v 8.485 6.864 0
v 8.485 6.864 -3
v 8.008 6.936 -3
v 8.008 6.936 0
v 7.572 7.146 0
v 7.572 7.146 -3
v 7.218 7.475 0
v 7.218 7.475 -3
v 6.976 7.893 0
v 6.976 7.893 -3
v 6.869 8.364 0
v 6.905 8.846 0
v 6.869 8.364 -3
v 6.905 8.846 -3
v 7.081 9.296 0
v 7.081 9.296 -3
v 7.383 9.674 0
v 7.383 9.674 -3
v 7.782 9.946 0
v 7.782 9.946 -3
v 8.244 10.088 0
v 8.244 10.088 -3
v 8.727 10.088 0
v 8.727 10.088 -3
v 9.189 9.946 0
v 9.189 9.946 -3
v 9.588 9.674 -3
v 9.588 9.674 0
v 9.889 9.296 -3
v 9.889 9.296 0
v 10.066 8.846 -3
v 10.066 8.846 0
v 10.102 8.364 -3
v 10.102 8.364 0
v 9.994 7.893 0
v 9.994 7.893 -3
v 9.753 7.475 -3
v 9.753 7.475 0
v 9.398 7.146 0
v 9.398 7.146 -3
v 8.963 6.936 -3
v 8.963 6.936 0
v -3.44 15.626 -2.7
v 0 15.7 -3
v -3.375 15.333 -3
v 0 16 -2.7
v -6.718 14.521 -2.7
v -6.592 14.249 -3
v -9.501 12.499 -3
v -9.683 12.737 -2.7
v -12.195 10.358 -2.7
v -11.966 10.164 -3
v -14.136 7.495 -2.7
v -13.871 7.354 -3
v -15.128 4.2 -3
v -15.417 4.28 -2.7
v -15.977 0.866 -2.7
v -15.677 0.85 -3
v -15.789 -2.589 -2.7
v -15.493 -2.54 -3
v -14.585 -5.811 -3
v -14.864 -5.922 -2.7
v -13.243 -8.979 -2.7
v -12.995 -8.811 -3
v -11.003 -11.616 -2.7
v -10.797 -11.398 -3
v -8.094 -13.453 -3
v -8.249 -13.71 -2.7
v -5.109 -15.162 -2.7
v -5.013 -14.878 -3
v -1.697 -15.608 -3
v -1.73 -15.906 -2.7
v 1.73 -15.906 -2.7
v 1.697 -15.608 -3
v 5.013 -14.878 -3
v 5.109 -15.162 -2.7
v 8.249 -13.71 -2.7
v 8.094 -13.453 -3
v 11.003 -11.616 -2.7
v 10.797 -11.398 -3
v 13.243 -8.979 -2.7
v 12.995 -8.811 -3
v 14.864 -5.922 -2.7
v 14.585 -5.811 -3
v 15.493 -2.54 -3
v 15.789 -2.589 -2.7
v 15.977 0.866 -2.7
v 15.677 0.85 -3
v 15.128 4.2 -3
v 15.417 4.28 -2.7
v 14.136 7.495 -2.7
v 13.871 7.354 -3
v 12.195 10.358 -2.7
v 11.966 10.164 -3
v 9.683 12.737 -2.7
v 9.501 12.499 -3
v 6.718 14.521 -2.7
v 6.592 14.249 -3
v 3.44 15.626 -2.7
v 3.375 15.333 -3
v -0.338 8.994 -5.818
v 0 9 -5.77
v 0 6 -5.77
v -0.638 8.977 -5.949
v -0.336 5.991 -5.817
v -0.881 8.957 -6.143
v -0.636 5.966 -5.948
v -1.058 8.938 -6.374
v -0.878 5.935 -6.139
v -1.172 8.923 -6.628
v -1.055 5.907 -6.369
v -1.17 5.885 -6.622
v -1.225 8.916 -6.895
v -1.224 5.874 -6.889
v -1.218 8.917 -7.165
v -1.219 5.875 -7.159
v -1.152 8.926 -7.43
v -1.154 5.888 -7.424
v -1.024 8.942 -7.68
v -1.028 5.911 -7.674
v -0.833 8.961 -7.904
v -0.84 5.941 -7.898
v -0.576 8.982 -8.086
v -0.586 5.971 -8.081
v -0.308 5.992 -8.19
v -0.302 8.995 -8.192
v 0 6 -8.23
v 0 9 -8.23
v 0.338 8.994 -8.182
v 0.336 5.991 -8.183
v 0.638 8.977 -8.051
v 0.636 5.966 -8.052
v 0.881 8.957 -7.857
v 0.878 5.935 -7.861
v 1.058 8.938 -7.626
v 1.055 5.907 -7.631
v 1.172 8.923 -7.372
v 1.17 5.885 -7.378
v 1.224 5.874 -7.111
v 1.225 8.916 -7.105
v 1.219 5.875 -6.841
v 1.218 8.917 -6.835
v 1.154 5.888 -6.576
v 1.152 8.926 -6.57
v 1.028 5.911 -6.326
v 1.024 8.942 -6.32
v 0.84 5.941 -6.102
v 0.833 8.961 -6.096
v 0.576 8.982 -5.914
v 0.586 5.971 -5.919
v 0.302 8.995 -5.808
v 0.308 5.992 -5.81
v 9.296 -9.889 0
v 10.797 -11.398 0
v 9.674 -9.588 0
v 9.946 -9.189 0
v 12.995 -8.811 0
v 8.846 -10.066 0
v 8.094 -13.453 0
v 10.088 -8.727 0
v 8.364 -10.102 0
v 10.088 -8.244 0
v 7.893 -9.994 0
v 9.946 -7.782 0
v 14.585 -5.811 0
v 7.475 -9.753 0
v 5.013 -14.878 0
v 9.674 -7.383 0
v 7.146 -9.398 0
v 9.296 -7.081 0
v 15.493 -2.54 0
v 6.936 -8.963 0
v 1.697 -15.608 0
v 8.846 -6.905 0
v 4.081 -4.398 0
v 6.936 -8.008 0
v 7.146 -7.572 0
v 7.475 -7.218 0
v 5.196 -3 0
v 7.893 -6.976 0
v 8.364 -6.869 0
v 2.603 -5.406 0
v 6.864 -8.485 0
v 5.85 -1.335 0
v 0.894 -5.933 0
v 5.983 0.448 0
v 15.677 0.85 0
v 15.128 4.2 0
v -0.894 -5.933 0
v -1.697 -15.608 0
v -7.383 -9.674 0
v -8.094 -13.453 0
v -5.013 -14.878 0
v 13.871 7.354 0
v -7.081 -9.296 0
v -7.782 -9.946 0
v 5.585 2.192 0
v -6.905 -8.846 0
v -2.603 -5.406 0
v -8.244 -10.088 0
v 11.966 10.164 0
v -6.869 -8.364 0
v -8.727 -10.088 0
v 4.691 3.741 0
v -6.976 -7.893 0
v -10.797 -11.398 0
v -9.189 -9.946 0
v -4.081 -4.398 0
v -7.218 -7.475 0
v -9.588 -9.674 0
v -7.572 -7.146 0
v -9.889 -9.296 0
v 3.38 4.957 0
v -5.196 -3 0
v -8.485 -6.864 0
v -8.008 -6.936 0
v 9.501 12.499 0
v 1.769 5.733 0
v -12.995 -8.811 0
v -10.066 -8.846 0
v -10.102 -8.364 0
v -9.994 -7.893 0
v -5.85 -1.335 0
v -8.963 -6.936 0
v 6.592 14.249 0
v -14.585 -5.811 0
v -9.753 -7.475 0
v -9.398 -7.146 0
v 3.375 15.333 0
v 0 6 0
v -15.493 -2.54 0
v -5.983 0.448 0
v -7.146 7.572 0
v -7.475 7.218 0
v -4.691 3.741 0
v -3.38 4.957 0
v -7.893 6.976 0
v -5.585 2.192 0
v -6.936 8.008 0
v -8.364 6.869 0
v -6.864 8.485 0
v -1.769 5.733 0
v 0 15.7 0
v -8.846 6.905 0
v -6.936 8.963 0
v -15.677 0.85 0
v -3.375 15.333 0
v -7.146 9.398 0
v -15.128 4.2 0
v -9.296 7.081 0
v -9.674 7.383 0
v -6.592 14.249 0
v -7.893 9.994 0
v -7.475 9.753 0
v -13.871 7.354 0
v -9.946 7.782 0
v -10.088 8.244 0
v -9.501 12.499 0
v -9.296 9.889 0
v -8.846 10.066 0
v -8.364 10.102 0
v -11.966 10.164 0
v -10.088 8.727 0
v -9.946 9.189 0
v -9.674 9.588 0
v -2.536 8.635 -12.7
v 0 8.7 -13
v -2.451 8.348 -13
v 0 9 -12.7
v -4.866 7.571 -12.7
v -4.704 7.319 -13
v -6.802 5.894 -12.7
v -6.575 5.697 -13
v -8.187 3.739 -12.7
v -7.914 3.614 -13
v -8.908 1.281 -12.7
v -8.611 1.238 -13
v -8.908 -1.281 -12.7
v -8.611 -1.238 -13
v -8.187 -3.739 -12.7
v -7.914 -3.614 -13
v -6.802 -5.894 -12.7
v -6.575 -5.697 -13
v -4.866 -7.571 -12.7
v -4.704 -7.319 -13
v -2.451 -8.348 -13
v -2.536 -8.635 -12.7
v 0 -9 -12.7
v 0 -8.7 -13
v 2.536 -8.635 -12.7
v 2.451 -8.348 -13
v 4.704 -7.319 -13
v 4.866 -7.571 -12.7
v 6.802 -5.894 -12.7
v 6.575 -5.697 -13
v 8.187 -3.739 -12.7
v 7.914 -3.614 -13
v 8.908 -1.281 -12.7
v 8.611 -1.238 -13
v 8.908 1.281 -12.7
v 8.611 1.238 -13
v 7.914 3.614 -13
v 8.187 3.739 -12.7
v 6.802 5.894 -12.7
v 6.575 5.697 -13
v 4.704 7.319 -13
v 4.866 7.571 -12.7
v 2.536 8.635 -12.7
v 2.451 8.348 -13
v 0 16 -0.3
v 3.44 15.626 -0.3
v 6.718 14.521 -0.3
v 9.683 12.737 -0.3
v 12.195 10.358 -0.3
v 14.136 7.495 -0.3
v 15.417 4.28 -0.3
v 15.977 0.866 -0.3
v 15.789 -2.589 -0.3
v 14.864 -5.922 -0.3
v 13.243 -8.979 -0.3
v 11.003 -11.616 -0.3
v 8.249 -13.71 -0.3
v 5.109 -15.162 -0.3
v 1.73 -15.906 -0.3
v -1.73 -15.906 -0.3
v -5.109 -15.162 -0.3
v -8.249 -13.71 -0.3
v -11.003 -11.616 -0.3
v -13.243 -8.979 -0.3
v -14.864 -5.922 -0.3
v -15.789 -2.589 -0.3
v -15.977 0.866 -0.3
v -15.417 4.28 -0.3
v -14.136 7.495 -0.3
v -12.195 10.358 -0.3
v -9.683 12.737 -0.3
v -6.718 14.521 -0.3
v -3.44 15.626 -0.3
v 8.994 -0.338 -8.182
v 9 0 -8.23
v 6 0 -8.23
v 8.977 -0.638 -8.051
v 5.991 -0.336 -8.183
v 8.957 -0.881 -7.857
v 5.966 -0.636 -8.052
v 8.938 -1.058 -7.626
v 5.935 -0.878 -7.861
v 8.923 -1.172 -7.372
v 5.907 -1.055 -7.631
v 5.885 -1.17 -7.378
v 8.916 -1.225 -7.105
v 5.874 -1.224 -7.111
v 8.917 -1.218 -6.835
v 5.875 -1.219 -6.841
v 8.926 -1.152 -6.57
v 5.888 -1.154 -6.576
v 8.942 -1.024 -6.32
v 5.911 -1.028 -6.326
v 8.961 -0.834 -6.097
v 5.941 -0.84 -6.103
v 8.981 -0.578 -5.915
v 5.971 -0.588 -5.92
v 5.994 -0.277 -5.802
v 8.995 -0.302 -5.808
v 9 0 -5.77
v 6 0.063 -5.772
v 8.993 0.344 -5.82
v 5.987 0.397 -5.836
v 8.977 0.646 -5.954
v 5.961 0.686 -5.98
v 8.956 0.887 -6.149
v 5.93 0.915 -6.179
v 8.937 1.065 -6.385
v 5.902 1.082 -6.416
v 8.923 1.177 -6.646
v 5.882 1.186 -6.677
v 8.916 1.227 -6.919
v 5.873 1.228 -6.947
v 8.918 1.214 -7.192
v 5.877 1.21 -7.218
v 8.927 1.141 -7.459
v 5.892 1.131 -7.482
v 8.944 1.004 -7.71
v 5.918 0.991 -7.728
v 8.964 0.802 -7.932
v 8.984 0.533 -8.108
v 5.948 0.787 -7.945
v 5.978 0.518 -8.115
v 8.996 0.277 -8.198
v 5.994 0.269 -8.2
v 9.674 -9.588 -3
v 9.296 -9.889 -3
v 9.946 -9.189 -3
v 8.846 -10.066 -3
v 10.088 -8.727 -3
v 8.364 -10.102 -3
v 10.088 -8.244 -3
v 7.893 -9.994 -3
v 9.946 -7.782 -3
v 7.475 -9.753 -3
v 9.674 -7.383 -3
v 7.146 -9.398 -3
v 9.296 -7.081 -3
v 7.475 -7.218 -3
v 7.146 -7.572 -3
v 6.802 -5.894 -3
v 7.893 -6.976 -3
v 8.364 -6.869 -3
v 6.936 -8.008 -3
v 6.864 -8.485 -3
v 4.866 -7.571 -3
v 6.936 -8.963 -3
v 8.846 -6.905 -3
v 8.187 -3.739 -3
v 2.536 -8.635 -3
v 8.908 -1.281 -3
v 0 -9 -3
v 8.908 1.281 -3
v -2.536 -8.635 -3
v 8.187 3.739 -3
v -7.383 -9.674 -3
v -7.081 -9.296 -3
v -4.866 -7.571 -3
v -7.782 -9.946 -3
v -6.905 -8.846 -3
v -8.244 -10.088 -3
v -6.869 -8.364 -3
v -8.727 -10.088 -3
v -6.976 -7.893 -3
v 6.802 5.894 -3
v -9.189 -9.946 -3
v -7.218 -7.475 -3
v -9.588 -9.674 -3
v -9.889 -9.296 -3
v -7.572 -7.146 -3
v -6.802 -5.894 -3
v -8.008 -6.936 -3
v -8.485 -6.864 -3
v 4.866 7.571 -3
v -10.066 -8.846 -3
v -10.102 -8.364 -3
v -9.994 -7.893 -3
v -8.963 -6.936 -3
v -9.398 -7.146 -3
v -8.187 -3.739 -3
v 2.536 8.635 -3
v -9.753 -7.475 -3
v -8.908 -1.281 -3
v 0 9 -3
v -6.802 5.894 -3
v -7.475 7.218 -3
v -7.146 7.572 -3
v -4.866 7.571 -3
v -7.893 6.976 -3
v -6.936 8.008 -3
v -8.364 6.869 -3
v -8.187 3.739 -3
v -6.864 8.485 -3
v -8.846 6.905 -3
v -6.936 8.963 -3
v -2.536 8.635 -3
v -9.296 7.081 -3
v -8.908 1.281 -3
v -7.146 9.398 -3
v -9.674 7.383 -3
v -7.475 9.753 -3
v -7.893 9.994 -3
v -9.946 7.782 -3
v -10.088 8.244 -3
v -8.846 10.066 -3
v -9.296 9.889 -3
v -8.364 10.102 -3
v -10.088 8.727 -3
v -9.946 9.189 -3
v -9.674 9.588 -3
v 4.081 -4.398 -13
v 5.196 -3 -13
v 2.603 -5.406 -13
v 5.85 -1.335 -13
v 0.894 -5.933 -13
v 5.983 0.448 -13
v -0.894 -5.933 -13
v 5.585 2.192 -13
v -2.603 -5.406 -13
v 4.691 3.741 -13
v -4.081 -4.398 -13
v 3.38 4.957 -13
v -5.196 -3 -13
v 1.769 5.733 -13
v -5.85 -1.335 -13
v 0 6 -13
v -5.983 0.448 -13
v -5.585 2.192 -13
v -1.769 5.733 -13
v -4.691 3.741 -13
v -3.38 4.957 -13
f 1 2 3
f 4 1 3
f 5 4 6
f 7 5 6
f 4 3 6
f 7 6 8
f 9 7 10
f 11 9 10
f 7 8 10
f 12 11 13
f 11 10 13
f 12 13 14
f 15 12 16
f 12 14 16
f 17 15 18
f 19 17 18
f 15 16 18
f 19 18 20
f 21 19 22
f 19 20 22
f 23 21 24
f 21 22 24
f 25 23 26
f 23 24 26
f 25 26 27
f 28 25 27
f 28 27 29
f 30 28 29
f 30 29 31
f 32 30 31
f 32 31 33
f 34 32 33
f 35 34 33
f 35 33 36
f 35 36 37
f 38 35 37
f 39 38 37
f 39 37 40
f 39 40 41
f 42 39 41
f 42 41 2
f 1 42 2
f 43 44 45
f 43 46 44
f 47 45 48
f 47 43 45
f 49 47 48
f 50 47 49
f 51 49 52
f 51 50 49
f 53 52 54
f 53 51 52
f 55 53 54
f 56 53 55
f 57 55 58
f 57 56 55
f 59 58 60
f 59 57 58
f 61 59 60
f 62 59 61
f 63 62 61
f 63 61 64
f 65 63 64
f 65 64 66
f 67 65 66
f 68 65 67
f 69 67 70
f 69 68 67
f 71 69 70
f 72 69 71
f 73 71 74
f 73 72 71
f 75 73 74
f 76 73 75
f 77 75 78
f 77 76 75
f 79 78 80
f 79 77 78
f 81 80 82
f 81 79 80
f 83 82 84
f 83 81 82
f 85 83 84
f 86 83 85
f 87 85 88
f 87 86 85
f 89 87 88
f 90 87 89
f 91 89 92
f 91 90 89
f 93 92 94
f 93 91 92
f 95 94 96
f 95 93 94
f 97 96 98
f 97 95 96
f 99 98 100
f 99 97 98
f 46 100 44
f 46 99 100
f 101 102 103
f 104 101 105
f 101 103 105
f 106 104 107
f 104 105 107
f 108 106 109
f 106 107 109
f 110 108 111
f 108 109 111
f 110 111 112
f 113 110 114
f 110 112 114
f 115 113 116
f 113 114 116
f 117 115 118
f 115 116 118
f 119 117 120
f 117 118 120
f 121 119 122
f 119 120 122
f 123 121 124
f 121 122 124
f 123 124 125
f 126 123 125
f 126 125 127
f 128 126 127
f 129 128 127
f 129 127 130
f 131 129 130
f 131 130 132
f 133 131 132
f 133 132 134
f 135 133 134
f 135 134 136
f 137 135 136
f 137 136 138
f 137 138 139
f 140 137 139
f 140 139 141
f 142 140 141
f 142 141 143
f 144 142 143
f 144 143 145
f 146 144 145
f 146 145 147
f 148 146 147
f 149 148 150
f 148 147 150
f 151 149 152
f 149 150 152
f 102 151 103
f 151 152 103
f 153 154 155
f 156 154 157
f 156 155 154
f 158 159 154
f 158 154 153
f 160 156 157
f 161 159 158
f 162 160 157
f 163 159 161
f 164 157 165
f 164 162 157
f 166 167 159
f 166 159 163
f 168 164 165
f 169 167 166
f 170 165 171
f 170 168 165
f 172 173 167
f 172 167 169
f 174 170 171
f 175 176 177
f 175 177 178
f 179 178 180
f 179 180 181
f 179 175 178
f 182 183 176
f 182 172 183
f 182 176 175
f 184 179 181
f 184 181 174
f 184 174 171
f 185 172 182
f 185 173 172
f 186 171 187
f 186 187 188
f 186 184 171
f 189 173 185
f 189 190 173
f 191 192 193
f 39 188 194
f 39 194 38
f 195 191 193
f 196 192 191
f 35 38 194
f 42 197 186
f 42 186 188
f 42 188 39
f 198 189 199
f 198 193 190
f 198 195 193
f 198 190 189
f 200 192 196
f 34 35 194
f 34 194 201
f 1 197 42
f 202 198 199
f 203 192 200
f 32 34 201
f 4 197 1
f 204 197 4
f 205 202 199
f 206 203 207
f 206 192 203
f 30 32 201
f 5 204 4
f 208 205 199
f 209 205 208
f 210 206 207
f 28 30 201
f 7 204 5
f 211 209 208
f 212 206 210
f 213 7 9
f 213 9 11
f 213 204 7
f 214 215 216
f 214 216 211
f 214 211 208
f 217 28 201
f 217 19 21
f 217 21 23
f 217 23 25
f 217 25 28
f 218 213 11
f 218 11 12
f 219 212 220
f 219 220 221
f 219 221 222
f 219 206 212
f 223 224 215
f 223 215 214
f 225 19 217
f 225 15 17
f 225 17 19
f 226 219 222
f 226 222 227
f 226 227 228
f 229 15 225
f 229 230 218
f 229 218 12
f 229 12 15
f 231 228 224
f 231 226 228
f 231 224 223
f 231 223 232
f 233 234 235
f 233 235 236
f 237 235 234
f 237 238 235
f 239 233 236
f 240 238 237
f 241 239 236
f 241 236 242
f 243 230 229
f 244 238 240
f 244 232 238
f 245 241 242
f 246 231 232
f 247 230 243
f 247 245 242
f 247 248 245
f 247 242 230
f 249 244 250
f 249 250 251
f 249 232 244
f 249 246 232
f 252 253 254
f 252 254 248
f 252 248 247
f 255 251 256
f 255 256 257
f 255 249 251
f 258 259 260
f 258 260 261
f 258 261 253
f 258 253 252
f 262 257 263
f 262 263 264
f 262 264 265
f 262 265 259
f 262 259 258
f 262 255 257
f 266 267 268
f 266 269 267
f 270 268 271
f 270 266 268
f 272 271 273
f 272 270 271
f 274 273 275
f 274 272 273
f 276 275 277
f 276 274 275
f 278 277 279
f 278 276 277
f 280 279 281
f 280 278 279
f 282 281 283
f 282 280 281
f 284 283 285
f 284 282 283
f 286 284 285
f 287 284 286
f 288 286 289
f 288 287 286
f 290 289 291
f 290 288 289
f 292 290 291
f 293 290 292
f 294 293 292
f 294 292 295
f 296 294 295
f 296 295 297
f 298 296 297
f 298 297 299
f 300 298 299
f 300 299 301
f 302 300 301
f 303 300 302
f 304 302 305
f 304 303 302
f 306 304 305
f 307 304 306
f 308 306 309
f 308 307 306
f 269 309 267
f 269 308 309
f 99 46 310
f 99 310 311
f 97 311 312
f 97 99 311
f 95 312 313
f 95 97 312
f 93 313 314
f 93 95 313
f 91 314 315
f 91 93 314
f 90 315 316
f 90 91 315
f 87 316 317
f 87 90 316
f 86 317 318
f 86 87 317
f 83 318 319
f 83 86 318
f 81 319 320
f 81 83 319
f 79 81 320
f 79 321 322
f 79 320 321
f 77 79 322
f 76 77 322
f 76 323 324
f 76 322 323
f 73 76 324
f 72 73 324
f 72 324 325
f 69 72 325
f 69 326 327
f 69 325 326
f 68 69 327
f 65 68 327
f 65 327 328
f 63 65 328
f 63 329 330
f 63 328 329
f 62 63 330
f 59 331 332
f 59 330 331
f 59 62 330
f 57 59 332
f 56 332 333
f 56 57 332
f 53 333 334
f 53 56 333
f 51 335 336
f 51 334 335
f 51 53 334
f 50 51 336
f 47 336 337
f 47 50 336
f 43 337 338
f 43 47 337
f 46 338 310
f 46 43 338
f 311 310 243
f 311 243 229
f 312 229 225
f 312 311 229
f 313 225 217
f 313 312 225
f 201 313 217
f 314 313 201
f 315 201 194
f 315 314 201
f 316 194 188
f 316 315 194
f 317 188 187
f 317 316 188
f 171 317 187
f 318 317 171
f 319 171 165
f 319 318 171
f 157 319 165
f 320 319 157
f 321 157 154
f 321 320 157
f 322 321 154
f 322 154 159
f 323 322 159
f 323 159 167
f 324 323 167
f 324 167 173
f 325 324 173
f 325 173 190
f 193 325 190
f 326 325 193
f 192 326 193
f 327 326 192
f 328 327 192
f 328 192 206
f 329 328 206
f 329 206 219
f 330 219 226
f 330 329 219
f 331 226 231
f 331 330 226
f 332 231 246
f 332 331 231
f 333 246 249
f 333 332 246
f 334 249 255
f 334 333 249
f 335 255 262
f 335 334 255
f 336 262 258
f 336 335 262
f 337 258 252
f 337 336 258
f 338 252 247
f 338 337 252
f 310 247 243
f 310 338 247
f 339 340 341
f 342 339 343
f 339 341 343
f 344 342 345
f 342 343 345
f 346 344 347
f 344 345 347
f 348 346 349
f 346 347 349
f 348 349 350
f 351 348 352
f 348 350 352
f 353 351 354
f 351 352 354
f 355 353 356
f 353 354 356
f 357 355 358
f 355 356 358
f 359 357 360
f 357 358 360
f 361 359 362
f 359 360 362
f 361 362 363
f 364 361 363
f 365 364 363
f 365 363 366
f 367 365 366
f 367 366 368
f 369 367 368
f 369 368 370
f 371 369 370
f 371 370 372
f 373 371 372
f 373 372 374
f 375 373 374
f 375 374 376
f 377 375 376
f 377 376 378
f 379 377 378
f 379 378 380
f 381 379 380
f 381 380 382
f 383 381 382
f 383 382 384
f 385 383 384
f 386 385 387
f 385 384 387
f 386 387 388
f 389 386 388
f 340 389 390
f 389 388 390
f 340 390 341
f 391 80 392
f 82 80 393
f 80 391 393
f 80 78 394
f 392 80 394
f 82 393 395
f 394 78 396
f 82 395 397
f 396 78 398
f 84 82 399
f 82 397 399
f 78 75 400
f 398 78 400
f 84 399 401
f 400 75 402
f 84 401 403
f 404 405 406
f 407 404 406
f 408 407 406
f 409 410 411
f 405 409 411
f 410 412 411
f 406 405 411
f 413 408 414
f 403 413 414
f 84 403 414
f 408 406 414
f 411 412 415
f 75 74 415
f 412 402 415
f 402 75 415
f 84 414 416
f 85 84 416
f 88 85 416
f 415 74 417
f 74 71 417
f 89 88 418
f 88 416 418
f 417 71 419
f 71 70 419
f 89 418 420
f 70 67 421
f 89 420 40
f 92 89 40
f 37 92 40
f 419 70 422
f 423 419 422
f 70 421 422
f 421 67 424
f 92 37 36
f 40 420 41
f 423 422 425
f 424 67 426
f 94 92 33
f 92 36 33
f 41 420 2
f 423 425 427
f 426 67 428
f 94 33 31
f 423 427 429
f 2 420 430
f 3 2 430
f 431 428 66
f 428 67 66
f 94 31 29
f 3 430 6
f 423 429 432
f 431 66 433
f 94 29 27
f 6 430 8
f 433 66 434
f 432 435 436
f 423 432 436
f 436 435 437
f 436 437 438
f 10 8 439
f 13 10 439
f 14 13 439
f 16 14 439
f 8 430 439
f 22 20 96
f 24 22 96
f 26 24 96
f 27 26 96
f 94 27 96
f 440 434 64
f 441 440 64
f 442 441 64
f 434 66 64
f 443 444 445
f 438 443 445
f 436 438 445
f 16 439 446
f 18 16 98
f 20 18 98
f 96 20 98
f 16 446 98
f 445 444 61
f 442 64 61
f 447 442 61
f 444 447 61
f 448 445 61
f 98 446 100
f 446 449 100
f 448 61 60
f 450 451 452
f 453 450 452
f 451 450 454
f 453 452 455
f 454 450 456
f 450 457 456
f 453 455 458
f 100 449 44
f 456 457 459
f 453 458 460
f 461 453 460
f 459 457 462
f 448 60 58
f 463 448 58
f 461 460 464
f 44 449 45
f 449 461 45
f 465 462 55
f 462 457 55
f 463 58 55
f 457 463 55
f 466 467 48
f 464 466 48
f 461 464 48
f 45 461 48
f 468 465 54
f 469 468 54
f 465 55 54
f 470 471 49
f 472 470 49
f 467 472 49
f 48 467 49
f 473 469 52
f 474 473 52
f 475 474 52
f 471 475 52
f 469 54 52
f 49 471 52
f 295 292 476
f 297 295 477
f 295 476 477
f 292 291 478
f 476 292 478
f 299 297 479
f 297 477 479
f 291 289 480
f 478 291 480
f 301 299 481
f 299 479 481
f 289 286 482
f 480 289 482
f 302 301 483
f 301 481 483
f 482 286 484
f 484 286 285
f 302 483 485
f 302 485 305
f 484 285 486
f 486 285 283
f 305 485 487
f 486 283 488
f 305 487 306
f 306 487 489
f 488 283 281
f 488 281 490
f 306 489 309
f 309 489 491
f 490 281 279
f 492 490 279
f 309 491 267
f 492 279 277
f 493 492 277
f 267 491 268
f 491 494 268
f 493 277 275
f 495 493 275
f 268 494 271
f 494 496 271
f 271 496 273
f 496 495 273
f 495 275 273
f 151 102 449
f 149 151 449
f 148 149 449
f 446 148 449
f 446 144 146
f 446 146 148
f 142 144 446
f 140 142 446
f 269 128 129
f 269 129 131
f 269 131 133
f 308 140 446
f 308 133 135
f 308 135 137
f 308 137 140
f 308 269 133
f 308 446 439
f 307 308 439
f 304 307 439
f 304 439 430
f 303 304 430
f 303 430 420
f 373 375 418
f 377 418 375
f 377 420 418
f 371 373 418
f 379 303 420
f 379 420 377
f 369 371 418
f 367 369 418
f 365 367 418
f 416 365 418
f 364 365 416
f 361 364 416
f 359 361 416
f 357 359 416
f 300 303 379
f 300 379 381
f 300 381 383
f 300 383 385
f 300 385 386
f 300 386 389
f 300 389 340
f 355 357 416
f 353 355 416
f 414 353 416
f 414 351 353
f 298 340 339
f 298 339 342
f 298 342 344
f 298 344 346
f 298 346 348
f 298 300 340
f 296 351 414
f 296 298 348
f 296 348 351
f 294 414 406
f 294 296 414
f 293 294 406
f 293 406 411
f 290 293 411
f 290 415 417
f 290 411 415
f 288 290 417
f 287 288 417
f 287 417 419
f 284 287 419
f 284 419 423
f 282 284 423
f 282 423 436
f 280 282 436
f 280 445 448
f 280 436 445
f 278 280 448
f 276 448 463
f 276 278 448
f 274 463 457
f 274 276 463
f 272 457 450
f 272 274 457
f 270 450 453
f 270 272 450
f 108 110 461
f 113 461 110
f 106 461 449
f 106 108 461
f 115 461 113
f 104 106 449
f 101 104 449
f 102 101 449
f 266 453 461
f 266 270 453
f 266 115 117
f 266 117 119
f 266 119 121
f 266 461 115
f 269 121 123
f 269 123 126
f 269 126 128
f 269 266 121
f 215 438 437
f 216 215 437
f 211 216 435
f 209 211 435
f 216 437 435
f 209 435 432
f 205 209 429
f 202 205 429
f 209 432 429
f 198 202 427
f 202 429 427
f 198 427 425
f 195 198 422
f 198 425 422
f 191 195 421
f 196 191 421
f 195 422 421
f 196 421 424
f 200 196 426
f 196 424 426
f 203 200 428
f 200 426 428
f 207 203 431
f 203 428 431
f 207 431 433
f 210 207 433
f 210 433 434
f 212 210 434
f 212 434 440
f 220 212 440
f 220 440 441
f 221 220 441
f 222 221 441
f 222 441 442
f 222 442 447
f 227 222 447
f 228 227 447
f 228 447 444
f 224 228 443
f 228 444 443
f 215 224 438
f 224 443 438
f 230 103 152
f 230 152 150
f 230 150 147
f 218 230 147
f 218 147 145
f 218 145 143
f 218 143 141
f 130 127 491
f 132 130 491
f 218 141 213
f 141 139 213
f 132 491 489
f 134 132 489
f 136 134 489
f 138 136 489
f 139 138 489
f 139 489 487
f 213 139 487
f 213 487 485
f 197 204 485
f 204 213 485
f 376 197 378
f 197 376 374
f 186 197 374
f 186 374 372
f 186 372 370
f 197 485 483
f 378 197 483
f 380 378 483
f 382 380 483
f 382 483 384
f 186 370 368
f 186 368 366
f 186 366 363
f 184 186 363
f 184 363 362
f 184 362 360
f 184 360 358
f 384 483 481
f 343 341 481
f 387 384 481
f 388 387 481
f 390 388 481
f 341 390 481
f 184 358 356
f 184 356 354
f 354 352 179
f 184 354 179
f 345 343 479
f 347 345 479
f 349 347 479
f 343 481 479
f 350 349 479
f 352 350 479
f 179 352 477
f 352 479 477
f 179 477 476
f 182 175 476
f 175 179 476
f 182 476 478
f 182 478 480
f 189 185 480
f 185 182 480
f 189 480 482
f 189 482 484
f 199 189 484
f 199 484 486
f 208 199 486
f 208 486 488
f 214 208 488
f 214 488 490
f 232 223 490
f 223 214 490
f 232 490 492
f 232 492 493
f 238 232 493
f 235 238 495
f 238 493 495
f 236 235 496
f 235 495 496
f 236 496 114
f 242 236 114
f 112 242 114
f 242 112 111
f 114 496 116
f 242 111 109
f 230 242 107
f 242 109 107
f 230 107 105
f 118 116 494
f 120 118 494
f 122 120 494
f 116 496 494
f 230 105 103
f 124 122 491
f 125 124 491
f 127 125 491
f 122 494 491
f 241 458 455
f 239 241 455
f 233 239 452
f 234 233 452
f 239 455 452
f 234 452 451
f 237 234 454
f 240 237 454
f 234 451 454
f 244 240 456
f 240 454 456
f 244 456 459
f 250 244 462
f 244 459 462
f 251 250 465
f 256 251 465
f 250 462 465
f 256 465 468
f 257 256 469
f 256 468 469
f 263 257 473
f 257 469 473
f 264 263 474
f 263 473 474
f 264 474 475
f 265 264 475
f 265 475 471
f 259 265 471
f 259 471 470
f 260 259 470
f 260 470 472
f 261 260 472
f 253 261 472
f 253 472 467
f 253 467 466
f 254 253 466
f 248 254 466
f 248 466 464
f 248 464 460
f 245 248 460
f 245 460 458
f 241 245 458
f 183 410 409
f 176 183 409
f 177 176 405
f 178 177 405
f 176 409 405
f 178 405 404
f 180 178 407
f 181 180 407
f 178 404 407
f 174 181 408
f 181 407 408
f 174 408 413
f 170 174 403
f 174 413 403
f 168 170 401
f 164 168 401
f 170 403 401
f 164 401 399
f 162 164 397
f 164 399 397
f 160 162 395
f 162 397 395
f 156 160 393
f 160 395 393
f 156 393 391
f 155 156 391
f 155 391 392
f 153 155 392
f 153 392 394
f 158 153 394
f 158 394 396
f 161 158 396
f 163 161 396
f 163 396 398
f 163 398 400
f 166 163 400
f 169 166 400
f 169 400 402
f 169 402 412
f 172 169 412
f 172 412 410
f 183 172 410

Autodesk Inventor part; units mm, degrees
ref_plane "XY Plane" through (0, 0, 0) normal (0, 0, 1) x (1, 0, 0)
sketch "Sketch1" plane through (0, 0, 0) normal (1, 0, 0) x (0, 1, 0)
  line L0 (6, 0) -> (16, 0)
  line L1 (16, 0) -> (16, -3)
  line L2 (16, -3) -> (9, -3)
  line L3 (9, -3) -> (9, -13)
  line L4 (9, -13) -> (6, -13)
  line L5 (6, 0) -> (6, -13)
  line L6 (0, -15.6) -> (0, 2.6) projected
  point P0 (0, 0)
  dimension "d1" = 3
  dimension "d3" = 10
  dimension "d23" = 3
  dimension "d24" = 10
  dimension "d25" = 6
revolve "Revolution1" add sketch "Sketch1" angle 360 about axis through (0, 0, -10) along (0, 0, 1)
chamfer "Chamfer1" distance 0.3 angle 45 3 edges at (0, -16, 0) (0, -16, -3) (0, -9, -13)
sketch "Sketch4" plane through (0, 0, 0) normal (0, 0, 1) x (1, 0, 0)
  line L0 (8.4853, 8.4853) -> (0, 0)
  line L1 (-22.4, 0) -> (22.4, 0) projected
  point P0 (8.4853, 8.4853)
  dimension "d37" = 45
  dimension "d38" = 8.4853
hole "Hole3" at (8.4853, 8.4853, 0) direction (0, 0, -1) diameter 3.242 depth 6 tip angle 118 thread size "M4x0.7" class "6H" standard "ISO Metric profile"
pattern_circular "Circular Pattern1" count 4 over 360 about axis through (0, 0, -10) along (0, 0, 1) of "Hole3"
ref_plane "Work Plane1" through (0, 9, 0) normal (0, 1, 0) x (-1, 0, 0)
ref_plane "Work Plane2" through (9, 0, 0) normal (1, 0, 0) x (0, 1, 0)
sketch "Sketch5" plane through (0, 9, 0) normal (0, 1, 0) x (-1, 0, 0)
  line L0 (8.7, -13) -> (-8.7, -13) projected
  point P0 (0, 0)
  point P1 (0, -7)
  dimension "d41" = 6
sketch "Sketch6" plane through (9, 0, 0) normal (1, 0, 0) x (0, 1, 0)
  line L0 (8.7, -13) -> (-8.7, -13) projected
  point P0 (0, 0)
  point P1 (0, -7)
  dimension "d42" = 6
hole "Hole4" at (0, 9, -7) direction (0, -1, 0) diameter 2.459 depth 8.8 tip angle 118 thread size "M3x0.5" class "6H" standard "ISO Metric profile"
hole "Hole5" at (9, 0, -7) direction (-1, 0, 0) diameter 2.459 depth 8.8 tip angle 118 thread size "M3x0.5" class "6H" standard "ISO Metric profile"
properties part number "kolnierz" material "Iron, Cast"
